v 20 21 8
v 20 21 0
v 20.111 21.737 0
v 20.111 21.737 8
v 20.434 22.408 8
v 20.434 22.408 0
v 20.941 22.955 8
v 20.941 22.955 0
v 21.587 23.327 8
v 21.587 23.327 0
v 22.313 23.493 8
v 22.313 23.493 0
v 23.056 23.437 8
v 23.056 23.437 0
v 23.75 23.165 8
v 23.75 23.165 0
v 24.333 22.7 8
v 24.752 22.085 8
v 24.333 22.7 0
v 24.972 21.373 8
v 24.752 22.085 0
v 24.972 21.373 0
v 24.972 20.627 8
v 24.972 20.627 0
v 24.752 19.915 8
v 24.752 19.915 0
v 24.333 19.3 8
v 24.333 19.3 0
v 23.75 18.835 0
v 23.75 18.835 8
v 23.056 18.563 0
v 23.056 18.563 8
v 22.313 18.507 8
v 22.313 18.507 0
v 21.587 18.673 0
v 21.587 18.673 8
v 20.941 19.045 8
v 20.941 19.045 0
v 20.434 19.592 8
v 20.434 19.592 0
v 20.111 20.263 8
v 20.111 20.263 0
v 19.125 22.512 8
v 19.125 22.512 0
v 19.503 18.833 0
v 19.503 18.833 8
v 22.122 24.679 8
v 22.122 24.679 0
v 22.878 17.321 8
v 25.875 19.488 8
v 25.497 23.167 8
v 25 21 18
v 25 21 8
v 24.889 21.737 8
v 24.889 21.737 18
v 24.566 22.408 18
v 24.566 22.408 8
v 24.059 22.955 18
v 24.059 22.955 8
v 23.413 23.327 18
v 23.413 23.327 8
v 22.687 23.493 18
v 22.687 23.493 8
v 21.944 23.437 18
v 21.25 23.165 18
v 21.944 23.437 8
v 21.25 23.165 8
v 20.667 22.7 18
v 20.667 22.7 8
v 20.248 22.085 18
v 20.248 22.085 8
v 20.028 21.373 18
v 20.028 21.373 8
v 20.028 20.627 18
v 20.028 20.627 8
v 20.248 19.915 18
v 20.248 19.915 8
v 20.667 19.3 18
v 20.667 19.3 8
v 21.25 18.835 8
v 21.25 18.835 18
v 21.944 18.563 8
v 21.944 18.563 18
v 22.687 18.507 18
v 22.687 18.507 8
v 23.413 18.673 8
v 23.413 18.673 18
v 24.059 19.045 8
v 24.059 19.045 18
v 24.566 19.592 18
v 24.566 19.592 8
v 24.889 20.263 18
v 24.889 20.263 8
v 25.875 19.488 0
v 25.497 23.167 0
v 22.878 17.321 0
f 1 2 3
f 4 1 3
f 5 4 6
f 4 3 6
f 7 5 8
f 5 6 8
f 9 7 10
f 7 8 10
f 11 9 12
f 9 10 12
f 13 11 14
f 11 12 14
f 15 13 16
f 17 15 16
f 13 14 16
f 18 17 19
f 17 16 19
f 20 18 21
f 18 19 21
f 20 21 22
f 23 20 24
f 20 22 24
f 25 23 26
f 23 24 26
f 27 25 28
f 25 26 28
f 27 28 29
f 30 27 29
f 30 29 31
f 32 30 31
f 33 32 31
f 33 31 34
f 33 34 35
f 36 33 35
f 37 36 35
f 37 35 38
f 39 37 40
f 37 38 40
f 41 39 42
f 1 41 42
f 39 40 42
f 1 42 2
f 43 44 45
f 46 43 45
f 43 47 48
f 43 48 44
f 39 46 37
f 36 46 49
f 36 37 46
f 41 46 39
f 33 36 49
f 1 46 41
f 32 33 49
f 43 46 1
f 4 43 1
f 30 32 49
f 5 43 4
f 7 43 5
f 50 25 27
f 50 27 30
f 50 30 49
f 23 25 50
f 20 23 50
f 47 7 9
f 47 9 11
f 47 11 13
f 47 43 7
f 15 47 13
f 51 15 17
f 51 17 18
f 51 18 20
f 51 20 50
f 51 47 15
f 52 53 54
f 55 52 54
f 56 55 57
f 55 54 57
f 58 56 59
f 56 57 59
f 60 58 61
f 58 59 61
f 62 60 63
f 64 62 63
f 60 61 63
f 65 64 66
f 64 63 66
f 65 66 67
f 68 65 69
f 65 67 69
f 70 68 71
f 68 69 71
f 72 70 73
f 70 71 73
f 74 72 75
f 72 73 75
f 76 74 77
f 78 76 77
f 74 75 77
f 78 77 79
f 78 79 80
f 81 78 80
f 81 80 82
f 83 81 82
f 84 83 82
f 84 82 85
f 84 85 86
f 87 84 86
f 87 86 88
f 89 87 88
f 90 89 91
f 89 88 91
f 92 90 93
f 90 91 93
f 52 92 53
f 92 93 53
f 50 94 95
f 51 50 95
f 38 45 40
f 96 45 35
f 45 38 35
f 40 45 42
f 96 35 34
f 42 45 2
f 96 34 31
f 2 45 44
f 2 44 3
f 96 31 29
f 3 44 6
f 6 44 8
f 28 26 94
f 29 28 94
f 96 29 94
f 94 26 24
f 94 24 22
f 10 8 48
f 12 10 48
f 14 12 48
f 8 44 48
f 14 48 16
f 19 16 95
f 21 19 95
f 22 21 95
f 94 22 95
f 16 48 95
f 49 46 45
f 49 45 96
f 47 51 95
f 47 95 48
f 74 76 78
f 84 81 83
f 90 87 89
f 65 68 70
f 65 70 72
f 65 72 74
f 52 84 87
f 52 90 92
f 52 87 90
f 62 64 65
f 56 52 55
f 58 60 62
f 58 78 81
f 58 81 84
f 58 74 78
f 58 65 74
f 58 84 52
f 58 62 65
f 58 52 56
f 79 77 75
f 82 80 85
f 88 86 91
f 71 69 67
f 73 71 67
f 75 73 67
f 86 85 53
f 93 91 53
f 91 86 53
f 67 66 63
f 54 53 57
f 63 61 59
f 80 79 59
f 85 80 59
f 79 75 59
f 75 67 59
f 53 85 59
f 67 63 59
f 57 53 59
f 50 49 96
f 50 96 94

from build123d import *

# Parameters (mm, degrees)
EXTRUDE_1_DEPTH     = 8
SKETCH_4_R          = 2.5
CUT_EXTRUDE_3_DEPTH = 8
SKETCH_5_R          = 2.5
EXTRUDE_2_DEPTH     = 10


with BuildPart() as part:
    # 草图1 → 凸台-拉伸1 (new body)
    with BuildSketch(Plane.XY):
        Polygon((22.121646003, 24.678746013), (19.1249355, 22.511708833), (19.503289497, 18.83296282), (22.878353997, 17.321253987), (25.8750645, 19.488291167), (25.496710503, 23.16703718), align=None)
    extrude(amount=EXTRUDE_1_DEPTH)

    # 草图4 → 切除-拉伸3 (cut)
    with BuildSketch(Plane(origin=(0, 0, 0), x_dir=(-1, 0, 0), z_dir=(0, 0, -1))):
        with Locations((-22.5, 21)):
            Circle(SKETCH_4_R)
    extrude(amount=-CUT_EXTRUDE_3_DEPTH, mode=Mode.SUBTRACT)


with BuildPart() as body_2:
    # 草图5 → 凸台-拉伸2 (new body)
    with BuildSketch(Plane.XY.offset(8)):
        with Locations((22.5, 21)):
            Circle(SKETCH_5_R)
    extrude(amount=EXTRUDE_2_DEPTH)


solid = Compound([part.part, body_2.part])
